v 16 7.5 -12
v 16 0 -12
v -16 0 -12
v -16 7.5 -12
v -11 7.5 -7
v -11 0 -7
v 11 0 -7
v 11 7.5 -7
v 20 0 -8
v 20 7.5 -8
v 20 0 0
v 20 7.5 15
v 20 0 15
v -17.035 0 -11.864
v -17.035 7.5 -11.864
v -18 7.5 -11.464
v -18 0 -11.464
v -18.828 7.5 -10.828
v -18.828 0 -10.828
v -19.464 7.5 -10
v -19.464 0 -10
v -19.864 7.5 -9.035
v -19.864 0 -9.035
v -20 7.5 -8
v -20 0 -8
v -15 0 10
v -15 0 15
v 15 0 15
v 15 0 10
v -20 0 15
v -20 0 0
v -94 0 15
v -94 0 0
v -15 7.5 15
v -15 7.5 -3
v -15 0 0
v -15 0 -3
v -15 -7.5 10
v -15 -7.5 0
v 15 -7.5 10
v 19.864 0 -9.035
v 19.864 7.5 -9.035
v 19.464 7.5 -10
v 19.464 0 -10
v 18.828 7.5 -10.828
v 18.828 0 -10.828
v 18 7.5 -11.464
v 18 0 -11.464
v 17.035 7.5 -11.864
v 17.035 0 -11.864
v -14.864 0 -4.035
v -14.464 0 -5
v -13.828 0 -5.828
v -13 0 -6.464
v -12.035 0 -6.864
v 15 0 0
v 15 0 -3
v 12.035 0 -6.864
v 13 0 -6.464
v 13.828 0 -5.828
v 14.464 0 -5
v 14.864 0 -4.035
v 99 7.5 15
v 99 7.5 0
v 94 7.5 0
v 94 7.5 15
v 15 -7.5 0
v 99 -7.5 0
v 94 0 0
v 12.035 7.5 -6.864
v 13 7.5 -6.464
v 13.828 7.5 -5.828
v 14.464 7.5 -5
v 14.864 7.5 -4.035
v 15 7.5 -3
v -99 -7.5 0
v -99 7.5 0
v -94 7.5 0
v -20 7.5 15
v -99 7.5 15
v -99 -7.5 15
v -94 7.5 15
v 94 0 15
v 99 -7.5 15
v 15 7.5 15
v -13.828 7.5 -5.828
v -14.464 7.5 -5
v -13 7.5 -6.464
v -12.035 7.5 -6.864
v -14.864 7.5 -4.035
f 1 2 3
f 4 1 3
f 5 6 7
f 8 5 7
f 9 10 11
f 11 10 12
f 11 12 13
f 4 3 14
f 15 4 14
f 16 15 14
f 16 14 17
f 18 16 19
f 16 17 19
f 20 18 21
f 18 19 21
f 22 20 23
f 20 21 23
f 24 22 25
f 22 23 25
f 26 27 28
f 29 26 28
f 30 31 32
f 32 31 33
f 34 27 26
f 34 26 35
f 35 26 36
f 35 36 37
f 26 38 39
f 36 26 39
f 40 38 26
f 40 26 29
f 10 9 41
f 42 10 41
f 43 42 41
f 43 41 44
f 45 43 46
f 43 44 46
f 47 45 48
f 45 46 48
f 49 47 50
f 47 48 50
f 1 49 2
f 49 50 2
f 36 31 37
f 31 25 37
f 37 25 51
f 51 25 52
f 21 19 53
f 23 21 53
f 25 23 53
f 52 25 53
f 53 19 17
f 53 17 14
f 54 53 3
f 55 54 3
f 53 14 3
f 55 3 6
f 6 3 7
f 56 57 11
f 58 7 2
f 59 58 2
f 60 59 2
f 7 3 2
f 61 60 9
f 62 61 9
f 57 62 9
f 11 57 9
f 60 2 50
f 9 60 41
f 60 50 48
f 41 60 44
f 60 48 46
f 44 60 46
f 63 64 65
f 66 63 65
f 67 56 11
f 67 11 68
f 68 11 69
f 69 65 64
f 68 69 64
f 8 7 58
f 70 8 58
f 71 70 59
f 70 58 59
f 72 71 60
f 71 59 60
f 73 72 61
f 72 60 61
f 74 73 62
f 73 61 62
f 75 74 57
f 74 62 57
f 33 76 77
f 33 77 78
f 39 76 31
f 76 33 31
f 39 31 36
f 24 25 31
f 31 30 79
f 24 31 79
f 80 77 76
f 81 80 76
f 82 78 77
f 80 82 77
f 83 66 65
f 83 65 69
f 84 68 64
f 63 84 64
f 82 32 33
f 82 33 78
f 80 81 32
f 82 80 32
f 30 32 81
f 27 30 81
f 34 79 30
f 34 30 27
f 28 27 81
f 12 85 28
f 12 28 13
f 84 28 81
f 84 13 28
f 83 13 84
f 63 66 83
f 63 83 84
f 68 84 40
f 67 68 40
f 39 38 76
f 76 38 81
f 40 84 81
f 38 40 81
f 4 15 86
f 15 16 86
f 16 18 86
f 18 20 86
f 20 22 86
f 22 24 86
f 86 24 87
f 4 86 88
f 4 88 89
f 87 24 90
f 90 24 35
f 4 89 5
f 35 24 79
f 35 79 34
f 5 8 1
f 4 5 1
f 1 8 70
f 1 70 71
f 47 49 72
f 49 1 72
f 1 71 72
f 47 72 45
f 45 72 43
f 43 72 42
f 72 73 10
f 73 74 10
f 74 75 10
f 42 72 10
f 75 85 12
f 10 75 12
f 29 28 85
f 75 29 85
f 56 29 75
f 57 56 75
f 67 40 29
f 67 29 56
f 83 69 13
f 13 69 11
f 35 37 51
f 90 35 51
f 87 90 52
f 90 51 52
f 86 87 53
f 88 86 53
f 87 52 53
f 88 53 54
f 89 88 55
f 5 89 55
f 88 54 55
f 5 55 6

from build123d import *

# Parameters (mm, degrees)
EXTRUDE_1_DEPTH          = 15
EXTRUDE_2_DEPTH          = 15
CUT_EXTRUDE_1_DEPTH      = 101.410407827
CUT_EXTRUDE_1_DEPTH_BACK = 101.410407827
SKETCH_3_W               = 30
SKETCH_3_H               = 10
EXTRUDE_3_DEPTH          = 7.5


with BuildPart() as part:
    # 草图1 → 凸台-拉伸1 (new body)
    with BuildSketch(Plane.XY):
        Polygon((-94, 7.5), (-99, 7.5), (-99, -7.5), (99, -7.5), (99, 7.5), (94, 7.5), (94, 0), (-94, 0), align=None)
    extrude(amount=EXTRUDE_1_DEPTH)

    # 草图2 → 凸台-拉伸2 (add)
    with BuildSketch(Plane.XY.offset(15)):
        Polygon((20, -7.5), (-20, -7.5), (-20, 7.5), (-15, 7.5), (-15, 0), (15, 0), (15, 7.5), (20, 7.5), align=None)
    extrude(amount=-EXTRUDE_2_DEPTH)

    # 草图3 → 切除-拉伸1 (cut, two sides: drawn at the far end of the back side and taken through both)
    with BuildSketch(Plane(origin=(0, 0, 0), x_dir=(1, 0, 0), z_dir=(0, 1, 0)).offset(-CUT_EXTRUDE_1_DEPTH_BACK)):
        with Locations((0, -5)):
            Rectangle(SKETCH_3_W, SKETCH_3_H)
    extrude(amount=CUT_EXTRUDE_1_DEPTH + CUT_EXTRUDE_1_DEPTH_BACK, mode=Mode.SUBTRACT)

    # 草图4 → 凸台-拉伸3 (add)
    with BuildSketch(Plane(origin=(0, 0, 0), x_dir=(1, 0, 0), z_dir=(0, 1, 0))):
        with BuildLine():
            Line((-15, -11.176683095), (-15, 3))
            ThreePointArc((-15, 3), (-13.828427125, 5.828427125), (-11, 7))
            Line((-11, 7), (11, 7))
            ThreePointArc((11, 7), (13.828427125, 5.828427125), (15, 3))
            Line((15, 3), (15, 0))
            Line((15, 0), (20, 0))
            Line((20, 0), (20, 8))
            ThreePointArc((20, 8), (18.828427125, 10.828427125), (16, 12))
            Line((16, 12), (-16, 12))
            ThreePointArc((-16, 12), (-18.828427125, 10.828427125), (-20, 8))
            Line((-20, 8), (-20, -11.176683095))
            Line((-20, -11.176683095), (-15, -11.176683095))
        make_face()
    extrude(amount=EXTRUDE_3_DEPTH)


solid = part.part
